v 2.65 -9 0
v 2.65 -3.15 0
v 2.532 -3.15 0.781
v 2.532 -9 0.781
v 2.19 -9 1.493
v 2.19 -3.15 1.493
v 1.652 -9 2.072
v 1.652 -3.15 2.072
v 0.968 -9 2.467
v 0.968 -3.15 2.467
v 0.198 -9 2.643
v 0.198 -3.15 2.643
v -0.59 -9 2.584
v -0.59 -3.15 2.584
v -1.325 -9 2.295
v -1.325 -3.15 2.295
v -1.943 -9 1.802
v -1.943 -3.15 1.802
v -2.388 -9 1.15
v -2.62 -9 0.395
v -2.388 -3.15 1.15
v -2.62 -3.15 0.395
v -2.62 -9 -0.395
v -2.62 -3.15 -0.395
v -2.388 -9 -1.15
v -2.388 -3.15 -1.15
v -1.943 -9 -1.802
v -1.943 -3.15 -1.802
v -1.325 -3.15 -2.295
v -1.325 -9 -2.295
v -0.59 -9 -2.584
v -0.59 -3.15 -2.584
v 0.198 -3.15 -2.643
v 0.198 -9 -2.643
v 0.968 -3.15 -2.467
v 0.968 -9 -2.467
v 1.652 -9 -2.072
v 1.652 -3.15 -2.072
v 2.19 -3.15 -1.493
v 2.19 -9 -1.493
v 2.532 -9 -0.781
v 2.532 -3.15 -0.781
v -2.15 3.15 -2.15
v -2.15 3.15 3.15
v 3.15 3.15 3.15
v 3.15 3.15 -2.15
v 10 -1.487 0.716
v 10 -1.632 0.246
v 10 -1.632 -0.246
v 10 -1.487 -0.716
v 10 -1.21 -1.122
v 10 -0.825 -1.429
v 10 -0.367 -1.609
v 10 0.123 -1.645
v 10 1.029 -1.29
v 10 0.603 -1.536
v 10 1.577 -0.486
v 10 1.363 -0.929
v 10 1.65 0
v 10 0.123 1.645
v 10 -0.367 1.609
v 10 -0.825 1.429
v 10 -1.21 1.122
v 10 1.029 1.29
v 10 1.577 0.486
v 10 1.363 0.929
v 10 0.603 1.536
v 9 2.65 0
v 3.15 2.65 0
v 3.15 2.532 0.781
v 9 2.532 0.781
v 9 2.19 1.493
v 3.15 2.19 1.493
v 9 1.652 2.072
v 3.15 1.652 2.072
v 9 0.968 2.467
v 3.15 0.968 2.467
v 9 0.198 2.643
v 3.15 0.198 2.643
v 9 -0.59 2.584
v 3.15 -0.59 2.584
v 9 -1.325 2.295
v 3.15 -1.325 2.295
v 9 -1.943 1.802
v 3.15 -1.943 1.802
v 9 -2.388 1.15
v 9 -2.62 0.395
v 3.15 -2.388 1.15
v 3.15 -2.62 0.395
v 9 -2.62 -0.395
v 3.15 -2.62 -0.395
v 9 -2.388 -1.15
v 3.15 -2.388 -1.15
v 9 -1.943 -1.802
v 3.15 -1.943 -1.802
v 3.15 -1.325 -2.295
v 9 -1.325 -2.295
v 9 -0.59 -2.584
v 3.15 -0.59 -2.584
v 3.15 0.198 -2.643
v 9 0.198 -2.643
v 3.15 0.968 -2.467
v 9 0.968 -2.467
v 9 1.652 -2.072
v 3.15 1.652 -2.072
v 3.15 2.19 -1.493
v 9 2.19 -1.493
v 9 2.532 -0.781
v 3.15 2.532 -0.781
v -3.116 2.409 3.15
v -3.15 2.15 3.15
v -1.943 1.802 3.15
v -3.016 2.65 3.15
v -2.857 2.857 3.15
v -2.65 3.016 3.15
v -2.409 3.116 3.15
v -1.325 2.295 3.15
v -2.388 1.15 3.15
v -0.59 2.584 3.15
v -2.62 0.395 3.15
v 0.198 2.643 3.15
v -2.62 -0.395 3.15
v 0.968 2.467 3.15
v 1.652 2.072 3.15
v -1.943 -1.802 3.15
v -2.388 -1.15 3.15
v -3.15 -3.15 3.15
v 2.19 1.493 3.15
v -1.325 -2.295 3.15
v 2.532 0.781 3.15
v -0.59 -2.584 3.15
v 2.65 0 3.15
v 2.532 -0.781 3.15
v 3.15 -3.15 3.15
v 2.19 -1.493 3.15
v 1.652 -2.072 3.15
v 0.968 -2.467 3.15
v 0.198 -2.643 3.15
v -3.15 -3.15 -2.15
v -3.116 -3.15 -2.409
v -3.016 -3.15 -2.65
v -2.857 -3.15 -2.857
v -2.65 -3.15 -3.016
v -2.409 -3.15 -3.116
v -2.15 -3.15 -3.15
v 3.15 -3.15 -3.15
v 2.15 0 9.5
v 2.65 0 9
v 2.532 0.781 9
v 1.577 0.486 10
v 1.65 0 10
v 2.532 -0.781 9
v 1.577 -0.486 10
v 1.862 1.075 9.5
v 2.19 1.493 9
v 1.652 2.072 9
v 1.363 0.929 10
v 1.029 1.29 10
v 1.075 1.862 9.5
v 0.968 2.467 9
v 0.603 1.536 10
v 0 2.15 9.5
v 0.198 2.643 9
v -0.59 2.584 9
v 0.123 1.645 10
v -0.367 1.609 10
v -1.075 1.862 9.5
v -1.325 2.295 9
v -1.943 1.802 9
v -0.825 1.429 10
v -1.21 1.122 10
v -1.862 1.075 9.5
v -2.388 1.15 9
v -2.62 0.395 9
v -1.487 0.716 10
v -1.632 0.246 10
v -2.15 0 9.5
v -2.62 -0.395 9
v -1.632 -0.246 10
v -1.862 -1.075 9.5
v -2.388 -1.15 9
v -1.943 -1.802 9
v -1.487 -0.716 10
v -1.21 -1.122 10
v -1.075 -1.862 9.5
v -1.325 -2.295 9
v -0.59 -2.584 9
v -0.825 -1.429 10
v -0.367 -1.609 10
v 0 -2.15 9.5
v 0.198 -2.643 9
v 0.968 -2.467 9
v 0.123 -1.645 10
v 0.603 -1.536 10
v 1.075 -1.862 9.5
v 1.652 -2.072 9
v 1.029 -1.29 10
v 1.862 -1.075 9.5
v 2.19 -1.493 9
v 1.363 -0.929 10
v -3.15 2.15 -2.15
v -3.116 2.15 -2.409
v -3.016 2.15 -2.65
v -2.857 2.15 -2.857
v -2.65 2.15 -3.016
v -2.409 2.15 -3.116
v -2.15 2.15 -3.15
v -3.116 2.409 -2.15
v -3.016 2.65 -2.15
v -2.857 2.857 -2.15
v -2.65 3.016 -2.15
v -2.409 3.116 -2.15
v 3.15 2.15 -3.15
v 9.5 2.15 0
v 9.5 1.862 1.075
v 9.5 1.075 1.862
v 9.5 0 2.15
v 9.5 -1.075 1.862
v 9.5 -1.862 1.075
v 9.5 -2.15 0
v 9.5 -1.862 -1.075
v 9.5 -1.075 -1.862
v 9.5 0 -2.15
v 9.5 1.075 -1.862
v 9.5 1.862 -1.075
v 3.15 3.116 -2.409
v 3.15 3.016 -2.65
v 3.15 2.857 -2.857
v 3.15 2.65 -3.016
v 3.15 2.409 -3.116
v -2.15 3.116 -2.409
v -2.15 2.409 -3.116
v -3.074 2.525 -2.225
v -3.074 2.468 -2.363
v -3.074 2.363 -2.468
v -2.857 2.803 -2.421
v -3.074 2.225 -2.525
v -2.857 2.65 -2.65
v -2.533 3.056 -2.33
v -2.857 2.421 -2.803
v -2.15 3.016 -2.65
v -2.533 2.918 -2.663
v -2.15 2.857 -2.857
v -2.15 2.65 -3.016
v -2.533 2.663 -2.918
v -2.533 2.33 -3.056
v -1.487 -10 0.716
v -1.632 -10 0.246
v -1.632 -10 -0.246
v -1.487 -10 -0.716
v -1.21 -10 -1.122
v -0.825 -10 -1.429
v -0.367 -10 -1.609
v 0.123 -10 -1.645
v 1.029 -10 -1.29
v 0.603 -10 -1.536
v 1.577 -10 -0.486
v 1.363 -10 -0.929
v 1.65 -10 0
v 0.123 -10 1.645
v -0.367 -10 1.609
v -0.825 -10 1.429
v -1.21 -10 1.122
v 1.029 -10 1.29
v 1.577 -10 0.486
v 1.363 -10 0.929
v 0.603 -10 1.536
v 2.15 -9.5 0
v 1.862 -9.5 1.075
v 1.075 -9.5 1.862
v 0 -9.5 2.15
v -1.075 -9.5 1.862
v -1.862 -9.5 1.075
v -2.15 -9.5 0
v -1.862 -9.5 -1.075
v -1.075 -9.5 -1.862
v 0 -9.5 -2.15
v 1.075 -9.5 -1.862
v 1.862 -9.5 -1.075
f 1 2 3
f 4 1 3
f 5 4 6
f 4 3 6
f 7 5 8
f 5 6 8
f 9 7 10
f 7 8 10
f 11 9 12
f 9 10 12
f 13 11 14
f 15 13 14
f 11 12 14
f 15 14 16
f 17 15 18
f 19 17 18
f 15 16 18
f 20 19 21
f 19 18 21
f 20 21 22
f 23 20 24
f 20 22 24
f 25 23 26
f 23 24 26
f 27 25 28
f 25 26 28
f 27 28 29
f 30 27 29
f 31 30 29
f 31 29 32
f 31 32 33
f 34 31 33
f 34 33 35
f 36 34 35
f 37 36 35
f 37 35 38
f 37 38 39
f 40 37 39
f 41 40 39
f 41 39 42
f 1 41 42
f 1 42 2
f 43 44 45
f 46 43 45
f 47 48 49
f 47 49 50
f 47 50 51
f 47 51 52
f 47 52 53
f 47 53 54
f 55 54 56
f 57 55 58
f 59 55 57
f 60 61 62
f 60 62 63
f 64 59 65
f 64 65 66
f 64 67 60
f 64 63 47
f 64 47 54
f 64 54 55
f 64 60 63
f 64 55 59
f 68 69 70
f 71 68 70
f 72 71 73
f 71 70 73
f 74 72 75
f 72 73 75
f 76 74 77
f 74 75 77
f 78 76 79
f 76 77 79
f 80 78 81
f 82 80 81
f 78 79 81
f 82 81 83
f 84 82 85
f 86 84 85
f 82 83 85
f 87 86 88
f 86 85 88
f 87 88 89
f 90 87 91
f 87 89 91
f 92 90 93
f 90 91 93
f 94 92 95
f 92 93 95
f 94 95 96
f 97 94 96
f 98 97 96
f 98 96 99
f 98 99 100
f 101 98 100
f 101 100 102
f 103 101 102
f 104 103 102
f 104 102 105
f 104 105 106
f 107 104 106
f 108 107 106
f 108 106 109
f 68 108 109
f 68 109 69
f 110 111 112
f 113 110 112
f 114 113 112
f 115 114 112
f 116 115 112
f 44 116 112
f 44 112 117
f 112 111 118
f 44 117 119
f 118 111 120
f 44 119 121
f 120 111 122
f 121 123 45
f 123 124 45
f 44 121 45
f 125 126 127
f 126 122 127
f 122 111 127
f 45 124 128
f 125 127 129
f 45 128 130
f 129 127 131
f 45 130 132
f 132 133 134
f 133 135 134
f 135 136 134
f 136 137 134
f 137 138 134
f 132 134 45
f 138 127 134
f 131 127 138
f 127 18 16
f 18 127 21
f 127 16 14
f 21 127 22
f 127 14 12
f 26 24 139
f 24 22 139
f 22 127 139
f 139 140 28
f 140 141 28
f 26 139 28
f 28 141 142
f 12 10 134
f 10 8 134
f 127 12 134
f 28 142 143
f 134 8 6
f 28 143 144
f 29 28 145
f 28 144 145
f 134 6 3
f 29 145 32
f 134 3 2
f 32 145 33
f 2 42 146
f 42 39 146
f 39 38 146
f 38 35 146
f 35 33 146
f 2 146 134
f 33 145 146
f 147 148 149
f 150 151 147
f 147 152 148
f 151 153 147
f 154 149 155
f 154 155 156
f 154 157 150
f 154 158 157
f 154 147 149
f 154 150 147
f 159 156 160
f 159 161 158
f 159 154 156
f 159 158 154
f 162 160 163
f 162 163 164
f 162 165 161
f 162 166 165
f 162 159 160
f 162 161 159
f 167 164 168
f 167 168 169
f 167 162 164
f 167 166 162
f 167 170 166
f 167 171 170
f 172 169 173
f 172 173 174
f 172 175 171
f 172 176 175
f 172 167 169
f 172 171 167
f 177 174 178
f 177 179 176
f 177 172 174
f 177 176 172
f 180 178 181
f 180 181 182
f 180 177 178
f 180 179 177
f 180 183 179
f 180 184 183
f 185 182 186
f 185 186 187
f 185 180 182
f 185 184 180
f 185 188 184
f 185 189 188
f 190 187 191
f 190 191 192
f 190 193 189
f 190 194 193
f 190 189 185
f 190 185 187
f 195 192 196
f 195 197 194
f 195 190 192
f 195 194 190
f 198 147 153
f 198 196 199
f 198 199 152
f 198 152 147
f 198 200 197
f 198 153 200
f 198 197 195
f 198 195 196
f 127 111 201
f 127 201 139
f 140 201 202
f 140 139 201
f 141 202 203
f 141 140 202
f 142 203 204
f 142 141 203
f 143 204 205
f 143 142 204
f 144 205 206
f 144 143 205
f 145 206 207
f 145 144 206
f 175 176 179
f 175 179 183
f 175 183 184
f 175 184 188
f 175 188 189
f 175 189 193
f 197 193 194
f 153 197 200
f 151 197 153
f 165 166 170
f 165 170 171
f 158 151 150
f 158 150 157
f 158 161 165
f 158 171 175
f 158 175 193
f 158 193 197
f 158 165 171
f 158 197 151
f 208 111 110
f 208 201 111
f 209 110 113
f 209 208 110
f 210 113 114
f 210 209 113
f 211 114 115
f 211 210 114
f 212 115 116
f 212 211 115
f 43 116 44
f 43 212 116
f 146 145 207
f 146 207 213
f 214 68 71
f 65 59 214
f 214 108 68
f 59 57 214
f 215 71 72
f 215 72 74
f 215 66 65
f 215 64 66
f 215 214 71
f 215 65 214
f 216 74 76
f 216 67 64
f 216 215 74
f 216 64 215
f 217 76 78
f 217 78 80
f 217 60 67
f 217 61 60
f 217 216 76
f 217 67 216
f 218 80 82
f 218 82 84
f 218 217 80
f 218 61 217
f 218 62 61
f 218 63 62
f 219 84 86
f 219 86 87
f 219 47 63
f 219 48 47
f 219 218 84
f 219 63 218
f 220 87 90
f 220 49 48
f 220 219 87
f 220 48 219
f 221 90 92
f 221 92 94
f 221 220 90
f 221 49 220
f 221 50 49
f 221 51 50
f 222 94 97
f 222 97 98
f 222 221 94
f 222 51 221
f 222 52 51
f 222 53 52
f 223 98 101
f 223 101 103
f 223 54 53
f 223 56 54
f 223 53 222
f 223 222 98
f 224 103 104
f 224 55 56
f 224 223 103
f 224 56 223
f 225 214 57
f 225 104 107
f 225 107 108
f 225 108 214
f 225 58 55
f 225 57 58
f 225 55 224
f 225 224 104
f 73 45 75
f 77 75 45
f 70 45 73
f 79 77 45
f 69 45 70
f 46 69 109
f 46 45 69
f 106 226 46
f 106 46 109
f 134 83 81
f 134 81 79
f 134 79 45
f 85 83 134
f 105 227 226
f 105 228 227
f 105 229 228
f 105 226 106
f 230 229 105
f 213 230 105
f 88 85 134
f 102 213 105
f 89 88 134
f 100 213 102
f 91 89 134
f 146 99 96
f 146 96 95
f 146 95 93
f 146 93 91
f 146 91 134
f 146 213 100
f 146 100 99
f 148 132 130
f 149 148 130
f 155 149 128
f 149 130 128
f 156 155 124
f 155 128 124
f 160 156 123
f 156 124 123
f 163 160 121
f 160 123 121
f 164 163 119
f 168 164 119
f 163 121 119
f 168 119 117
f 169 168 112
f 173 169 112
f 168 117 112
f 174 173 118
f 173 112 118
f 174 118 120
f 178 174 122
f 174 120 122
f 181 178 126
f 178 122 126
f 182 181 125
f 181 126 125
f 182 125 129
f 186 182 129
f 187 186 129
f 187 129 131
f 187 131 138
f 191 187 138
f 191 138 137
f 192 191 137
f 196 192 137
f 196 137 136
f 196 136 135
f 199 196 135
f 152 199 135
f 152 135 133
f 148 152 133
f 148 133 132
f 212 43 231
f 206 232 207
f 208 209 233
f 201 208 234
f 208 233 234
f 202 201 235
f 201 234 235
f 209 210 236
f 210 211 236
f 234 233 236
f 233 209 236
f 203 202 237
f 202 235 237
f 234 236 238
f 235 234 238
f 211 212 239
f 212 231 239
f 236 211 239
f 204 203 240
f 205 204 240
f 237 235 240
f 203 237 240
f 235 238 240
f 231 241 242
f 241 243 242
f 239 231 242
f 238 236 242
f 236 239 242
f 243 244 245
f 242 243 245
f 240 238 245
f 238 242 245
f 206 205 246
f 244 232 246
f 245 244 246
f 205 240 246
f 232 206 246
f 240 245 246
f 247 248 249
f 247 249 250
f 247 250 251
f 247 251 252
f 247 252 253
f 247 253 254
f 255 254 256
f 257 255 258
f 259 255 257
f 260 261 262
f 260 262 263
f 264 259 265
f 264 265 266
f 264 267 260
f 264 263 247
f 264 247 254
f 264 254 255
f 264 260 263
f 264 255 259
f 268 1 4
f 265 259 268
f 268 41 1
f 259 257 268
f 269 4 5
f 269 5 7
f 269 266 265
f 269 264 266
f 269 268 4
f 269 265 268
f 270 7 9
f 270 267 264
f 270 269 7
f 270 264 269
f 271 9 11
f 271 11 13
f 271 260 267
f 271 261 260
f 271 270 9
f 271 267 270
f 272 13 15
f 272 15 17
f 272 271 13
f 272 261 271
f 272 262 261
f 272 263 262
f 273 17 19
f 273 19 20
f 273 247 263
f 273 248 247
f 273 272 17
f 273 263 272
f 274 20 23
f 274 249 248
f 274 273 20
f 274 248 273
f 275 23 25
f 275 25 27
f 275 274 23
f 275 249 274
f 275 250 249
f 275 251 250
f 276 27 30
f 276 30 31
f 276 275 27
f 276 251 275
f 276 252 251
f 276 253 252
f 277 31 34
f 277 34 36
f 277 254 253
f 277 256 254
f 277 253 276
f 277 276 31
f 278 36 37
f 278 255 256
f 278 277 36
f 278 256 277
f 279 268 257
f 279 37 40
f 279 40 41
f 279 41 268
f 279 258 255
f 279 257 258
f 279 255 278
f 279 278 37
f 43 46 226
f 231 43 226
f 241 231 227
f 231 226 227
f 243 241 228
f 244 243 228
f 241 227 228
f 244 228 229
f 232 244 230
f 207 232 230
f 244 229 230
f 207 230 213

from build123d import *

# Parameters (mm, degrees)
F2_R     = 2.65
F5_DEPTH = 10
F4_R     = 2.65
F6_DEPTH = 10
F3_R     = 2.65
F7_DEPTH = 10
F8_W     = 6.3
F8_H     = 6.3
F9_DEPTH = 3.15
F10_R    = 1
F11_SIZE = 1


with BuildPart() as f5:
    # F2 (on Front) → F5 (new body)
    with BuildSketch(Plane.XZ):
        Circle(F2_R)
    extrude(amount=F5_DEPTH)

    # F4 (on Top) → F6 (join)
    with BuildSketch(Plane.XY):
        Circle(F4_R)
    extrude(amount=F6_DEPTH)

    # F3 (on Right) → F7 (join)
    with BuildSketch(Plane.YZ):
        Circle(F3_R)
    extrude(amount=F7_DEPTH)

    # F8 (on face) → F9 (join, symmetric)
    with BuildSketch(Plane(origin=(0, 0, 0), x_dir=(1, 0, 0), z_dir=(0, 0, -1))):
        Rectangle(F8_W, F8_H)
        with BuildLine():
            Line((-2.65, 0), (0, 0))
            Line((0, 0), (0, -2.65))
            ThreePointArc((0, -2.65), (-1.8738329701, -1.8738329701), (-2.65, 0))
        make_face(mode=Mode.SUBTRACT)
        with BuildLine():
            Line((0, -2.65), (0, 0))
            Line((0, 0), (-2.65, 0))
            ThreePointArc((-2.65, 0), (-1.8738329701, -1.8738329701), (0, -2.65))
        make_face()
    extrude(amount=F9_DEPTH, both=True)

    # F10
    f10_edges = [f5.edges().sort_by_distance(p)[0] for p in [
        (0, 3.15, -3.15),
        (-3.15, 3.15, 0),
        (-3.15, 0, -3.15),
    ]]
    fillet(f10_edges, radius=F10_R)

    # F11
    f11_edges = [f5.edges().sort_by_distance(p)[0] for p in [
        (10, -2.65, 0),
        (-2.65, 0, 10),
        (-2.65, -10, 0),
    ]]
    chamfer(f11_edges, length=F11_SIZE)


solid = f5.part
